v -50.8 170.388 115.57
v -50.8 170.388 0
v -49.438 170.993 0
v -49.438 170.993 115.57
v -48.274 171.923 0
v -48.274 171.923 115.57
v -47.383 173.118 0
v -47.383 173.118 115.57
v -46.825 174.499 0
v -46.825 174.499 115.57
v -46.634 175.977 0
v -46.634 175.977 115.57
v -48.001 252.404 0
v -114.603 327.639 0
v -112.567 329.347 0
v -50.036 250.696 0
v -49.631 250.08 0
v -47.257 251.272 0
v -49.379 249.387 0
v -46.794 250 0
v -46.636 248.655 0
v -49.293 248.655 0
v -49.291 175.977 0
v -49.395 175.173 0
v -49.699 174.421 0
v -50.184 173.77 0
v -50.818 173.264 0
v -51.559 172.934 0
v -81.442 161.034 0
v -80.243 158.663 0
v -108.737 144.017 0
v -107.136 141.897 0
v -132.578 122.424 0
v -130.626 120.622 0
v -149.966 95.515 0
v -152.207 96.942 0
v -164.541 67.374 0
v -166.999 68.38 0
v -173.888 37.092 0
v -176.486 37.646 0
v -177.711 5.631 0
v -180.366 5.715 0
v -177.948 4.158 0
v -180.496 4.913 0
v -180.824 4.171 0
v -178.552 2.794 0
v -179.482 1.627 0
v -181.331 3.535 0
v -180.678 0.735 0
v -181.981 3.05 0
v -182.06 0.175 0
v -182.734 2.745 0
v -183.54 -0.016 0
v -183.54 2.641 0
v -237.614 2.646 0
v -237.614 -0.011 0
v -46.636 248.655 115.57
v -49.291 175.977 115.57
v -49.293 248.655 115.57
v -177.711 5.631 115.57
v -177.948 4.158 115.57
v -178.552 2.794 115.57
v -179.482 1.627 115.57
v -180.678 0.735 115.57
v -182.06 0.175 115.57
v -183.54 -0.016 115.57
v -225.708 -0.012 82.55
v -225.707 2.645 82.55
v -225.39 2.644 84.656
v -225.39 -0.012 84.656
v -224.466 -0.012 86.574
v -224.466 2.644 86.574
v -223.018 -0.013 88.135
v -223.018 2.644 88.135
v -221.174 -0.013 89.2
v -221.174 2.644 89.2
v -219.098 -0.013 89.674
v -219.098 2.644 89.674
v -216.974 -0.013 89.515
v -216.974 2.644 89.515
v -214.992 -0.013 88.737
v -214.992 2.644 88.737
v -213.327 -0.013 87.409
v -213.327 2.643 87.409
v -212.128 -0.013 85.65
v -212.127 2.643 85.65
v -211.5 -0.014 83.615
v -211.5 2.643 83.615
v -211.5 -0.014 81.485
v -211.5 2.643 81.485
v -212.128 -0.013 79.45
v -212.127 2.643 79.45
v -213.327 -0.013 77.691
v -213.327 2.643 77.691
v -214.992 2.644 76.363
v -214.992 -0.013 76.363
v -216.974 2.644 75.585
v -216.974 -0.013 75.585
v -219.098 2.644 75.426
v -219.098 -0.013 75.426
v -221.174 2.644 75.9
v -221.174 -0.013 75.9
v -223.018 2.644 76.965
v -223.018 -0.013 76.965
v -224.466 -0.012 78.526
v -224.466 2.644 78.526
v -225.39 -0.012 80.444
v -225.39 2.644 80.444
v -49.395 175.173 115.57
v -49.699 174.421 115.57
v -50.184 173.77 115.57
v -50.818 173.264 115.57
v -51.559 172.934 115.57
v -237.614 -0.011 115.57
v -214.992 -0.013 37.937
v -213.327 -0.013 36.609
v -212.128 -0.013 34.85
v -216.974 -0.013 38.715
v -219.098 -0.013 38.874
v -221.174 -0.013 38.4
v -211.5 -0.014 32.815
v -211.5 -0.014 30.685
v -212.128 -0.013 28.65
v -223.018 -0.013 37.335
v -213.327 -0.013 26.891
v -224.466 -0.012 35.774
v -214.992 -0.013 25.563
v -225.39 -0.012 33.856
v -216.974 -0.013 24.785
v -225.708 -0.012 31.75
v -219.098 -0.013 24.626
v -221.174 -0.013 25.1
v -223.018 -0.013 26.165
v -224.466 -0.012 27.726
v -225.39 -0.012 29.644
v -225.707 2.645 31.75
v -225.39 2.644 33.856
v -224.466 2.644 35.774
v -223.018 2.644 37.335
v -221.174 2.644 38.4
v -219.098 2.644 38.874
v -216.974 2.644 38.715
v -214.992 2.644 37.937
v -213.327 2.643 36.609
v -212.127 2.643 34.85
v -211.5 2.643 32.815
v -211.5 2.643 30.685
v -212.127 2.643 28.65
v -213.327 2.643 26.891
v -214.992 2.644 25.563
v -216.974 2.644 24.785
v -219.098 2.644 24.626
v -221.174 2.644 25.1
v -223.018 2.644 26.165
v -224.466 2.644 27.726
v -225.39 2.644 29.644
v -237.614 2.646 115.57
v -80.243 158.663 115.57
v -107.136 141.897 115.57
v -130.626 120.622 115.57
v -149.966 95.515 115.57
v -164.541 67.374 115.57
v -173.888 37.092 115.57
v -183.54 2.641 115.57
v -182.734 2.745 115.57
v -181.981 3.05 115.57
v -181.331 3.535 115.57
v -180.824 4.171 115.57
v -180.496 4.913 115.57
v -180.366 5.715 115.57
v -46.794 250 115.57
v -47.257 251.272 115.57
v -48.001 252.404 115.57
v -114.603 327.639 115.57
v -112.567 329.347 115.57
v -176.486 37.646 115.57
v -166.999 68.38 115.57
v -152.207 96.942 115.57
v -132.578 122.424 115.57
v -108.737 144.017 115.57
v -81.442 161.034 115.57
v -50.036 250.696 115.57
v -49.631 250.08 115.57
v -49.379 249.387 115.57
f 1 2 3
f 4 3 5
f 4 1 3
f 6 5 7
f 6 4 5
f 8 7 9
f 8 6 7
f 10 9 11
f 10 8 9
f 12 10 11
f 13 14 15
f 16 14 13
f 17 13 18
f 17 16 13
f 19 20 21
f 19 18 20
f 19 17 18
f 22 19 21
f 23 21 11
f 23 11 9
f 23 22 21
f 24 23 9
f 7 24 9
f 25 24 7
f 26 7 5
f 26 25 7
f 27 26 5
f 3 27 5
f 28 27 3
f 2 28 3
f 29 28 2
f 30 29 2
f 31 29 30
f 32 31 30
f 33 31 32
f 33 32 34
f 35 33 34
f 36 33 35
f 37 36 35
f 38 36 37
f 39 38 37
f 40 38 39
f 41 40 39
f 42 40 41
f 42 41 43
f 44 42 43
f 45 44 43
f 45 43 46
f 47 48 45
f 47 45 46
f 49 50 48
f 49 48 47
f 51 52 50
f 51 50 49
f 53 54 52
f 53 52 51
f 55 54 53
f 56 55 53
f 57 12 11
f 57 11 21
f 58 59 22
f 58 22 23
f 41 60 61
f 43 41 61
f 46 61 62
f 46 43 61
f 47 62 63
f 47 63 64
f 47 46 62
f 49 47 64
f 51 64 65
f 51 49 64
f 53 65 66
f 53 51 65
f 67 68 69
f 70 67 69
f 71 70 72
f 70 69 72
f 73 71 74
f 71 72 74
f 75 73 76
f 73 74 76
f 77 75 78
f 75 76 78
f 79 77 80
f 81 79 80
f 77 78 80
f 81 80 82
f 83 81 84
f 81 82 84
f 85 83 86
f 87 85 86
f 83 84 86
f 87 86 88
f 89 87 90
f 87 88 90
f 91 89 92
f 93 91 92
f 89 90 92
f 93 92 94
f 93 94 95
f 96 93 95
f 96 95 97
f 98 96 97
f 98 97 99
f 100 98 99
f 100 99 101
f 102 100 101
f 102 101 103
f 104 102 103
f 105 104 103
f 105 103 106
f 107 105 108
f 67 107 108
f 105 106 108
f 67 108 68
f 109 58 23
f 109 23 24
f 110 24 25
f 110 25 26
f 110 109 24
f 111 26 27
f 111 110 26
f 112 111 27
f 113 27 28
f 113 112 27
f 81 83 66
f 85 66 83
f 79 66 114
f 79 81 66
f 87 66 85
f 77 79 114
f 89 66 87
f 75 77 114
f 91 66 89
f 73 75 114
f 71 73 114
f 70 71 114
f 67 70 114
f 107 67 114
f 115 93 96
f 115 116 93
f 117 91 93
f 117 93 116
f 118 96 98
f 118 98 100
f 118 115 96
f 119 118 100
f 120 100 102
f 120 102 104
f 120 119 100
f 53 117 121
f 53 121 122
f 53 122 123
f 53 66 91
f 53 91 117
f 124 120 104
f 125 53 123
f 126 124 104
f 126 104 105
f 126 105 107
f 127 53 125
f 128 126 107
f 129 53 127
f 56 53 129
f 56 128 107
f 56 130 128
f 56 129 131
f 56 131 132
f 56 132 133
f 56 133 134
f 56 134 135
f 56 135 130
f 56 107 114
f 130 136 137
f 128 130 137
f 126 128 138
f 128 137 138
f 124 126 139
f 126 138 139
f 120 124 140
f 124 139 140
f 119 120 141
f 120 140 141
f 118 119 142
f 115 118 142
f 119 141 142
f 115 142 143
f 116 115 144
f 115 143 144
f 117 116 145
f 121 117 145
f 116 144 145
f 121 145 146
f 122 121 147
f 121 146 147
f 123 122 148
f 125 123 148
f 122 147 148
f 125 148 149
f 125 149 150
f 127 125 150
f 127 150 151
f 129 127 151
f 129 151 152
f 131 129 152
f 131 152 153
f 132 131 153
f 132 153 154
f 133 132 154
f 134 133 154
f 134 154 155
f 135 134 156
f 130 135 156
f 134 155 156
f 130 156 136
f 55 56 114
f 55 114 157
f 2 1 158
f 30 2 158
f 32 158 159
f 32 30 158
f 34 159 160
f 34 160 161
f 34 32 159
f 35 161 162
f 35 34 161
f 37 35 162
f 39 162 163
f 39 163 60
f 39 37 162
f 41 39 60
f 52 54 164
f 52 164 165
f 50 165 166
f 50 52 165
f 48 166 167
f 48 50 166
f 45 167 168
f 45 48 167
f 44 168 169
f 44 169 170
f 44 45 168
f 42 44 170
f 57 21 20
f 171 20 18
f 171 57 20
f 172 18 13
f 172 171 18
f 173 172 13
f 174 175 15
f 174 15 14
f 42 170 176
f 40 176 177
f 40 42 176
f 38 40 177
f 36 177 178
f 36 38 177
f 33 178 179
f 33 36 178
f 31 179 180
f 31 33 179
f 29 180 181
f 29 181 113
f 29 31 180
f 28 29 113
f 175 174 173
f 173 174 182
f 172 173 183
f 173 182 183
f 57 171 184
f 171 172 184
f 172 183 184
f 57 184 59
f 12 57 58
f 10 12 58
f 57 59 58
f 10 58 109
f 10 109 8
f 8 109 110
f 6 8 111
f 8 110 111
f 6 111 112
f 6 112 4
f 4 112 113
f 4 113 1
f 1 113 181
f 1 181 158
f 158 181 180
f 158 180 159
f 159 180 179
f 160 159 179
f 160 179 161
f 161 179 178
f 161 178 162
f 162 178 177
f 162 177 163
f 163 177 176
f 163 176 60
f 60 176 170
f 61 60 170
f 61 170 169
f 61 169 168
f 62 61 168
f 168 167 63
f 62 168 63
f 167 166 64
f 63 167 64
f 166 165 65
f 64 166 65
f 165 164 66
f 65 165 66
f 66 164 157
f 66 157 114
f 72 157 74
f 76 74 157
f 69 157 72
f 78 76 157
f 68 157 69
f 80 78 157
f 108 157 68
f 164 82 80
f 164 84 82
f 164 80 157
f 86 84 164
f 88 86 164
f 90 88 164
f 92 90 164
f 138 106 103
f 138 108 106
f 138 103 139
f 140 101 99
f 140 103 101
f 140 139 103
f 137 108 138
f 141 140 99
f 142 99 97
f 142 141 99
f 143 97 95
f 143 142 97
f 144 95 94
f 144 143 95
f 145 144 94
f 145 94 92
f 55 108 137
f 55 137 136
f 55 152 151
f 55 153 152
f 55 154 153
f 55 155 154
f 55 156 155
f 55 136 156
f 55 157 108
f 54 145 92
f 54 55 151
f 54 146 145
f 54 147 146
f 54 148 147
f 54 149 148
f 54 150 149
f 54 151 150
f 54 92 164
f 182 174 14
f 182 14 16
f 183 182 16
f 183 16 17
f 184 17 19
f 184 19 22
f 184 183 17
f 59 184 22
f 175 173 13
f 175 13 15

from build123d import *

# Parameters (mm, degrees)
BASE_FLANGE1_DEPTH           = 115.57
EDGE_FLANGE1_DEPTH           = 115.57
EDGE_FLANGE2_STRIP_CUT_DEPTH = 115.57
EDGE_FLANGE2_DEPTH           = 115.57
EDGE_FLANGE3_DEPTH           = 115.57
SKETCH20_R                   = 7.14375
CUT_EXTRUDE1_DEPTH           = 2.65684


# Sheet-metal steps are written as plain solids
with BuildPart() as part:
    # Sketch1 → Base-Flange1 (new body)
    with BuildSketch(Plane.XY):
        with BuildLine():
            ThreePointArc((-50.8, 170.388379885), (-140.856418383, 108.500273734), (-177.710803869, 5.63118))
            Line((-177.710803869, 5.63118), (-180.366311024, 5.715325918))
            ThreePointArc((-180.366311024, 5.715325918), (-142.961215721, 110.121577824), (-51.559097143, 172.934469105))
            Line((-51.559097143, 172.934469105), (-50.8, 170.388379885))
        make_face()
    extrude(amount=BASE_FLANGE1_DEPTH)

    # Edge-Flange1 section (across the edge) → Edge-Flange1 (add)
    with BuildSketch(Plane(origin=(-49.291175996, 173.610632552, 115.57), x_dir=(-0.9999999996342678, -2.7045604981235094e-05, 0), z_dir=(0, 0, -1))):
        with BuildLine():
            Line((-2.65684, 2.366572064), (-2.65684, 76.2))
            Line((-2.65684, 76.2), (0, 76.2))
            Line((0, 76.2), (0, 2.366572064))
            ThreePointArc((0, 2.366572064), (0.62936233, 0.469112223), (2.267939433, -0.676102109))
            Line((2.267939433, -0.676102109), (1.508911151, -3.222211858))
            ThreePointArc((1.508911151, -3.222211858), (-1.500827273, -1.118682173), (-2.65684, 2.366572064))
        make_face()
    extrude(amount=EDGE_FLANGE1_DEPTH)

    # Edge-Flange2 strip (across the edge) → Edge-Flange2 strip cut (cut)
    with BuildSketch(Plane(origin=(-49.293236871, 249.810632524, 115.57), x_dir=(-0.766027058259036, -0.6428083275868535, 0), z_dir=(0, 0, -1))):
        Polygon((-12.205285278, 10.412383287), (-1.292448625, -2.593029), (0.742808893, -0.885245167), (-10.17002776, 12.12016712), align=None)
    extrude(amount=EDGE_FLANGE2_STRIP_CUT_DEPTH, mode=Mode.SUBTRACT)

    # Edge-Flange2 section (across the edge) → Edge-Flange2 (add)
    with BuildSketch(Plane(origin=(-49.293236871, 249.810632524, 115.57), x_dir=(-0.766027058259036, -0.6428083275868535, 0), z_dir=(0, 0, -1))):
        with BuildLine():
            Line((-2.65684, 1.155605494), (-2.65684, 101.6))
            Line((-2.65684, 101.6), (0, 101.6))
            Line((0, 101.6), (0, 1.155605494))
            ThreePointArc((0, 1.155605494), (0.191475929, 0.069691539), (0.742808893, -0.885245167))
            Line((0.742808893, -0.885245167), (-1.292448625, -2.593029))
            ThreePointArc((-1.292448625, -2.593029), (-2.305137014, -0.839001259), (-2.65684, 1.155605494))
        make_face()
    extrude(amount=EDGE_FLANGE2_DEPTH)

    # Edge-Flange3 section (across the edge) → Edge-Flange3 (add)
    with BuildSketch(Plane(origin=(-180.463740314, 2.640617339, 0), x_dir=(8.626632785422443e-05, 0.9999999962790604, 0), z_dir=(0, 0, 1))):
        with BuildLine():
            Line((-2.65684, 3.076251829), (-2.65684, 57.15))
            Line((-2.65684, 57.15), (0, 57.15))
            Line((0, 57.15), (0, 3.076251829))
            ThreePointArc((0, 3.076251829), (0.894756196, 0.86692768), (3.074716973, -0.097164046))
            Line((3.074716973, -0.097164046), (2.990800136, -2.75267845))
            ThreePointArc((2.990800136, -2.75267845), (-1.013351819, -0.981834768), (-2.65684, 3.076251829))
        make_face()
    extrude(amount=EDGE_FLANGE3_DEPTH)

    # Sketch20 → Cut-Extrude1 (cut)
    with BuildSketch(Plane(origin=(0.000226453, 2.625049375, 0), x_dir=(0.9999999962790604, -8.626632785420363e-05, 0), z_dir=(8.626632785420363e-05, 0.9999999962790604, 0))):
        with Locations(Location((-218.563967439, -31.75, 0), (0, 0, 180))):
            Circle(SKETCH20_R)
        with Locations(Location((-218.563967439, -82.55, 0), (0, 0, 180))):
            Circle(SKETCH20_R)
    extrude(amount=-CUT_EXTRUDE1_DEPTH, mode=Mode.SUBTRACT)


solid = part.part
